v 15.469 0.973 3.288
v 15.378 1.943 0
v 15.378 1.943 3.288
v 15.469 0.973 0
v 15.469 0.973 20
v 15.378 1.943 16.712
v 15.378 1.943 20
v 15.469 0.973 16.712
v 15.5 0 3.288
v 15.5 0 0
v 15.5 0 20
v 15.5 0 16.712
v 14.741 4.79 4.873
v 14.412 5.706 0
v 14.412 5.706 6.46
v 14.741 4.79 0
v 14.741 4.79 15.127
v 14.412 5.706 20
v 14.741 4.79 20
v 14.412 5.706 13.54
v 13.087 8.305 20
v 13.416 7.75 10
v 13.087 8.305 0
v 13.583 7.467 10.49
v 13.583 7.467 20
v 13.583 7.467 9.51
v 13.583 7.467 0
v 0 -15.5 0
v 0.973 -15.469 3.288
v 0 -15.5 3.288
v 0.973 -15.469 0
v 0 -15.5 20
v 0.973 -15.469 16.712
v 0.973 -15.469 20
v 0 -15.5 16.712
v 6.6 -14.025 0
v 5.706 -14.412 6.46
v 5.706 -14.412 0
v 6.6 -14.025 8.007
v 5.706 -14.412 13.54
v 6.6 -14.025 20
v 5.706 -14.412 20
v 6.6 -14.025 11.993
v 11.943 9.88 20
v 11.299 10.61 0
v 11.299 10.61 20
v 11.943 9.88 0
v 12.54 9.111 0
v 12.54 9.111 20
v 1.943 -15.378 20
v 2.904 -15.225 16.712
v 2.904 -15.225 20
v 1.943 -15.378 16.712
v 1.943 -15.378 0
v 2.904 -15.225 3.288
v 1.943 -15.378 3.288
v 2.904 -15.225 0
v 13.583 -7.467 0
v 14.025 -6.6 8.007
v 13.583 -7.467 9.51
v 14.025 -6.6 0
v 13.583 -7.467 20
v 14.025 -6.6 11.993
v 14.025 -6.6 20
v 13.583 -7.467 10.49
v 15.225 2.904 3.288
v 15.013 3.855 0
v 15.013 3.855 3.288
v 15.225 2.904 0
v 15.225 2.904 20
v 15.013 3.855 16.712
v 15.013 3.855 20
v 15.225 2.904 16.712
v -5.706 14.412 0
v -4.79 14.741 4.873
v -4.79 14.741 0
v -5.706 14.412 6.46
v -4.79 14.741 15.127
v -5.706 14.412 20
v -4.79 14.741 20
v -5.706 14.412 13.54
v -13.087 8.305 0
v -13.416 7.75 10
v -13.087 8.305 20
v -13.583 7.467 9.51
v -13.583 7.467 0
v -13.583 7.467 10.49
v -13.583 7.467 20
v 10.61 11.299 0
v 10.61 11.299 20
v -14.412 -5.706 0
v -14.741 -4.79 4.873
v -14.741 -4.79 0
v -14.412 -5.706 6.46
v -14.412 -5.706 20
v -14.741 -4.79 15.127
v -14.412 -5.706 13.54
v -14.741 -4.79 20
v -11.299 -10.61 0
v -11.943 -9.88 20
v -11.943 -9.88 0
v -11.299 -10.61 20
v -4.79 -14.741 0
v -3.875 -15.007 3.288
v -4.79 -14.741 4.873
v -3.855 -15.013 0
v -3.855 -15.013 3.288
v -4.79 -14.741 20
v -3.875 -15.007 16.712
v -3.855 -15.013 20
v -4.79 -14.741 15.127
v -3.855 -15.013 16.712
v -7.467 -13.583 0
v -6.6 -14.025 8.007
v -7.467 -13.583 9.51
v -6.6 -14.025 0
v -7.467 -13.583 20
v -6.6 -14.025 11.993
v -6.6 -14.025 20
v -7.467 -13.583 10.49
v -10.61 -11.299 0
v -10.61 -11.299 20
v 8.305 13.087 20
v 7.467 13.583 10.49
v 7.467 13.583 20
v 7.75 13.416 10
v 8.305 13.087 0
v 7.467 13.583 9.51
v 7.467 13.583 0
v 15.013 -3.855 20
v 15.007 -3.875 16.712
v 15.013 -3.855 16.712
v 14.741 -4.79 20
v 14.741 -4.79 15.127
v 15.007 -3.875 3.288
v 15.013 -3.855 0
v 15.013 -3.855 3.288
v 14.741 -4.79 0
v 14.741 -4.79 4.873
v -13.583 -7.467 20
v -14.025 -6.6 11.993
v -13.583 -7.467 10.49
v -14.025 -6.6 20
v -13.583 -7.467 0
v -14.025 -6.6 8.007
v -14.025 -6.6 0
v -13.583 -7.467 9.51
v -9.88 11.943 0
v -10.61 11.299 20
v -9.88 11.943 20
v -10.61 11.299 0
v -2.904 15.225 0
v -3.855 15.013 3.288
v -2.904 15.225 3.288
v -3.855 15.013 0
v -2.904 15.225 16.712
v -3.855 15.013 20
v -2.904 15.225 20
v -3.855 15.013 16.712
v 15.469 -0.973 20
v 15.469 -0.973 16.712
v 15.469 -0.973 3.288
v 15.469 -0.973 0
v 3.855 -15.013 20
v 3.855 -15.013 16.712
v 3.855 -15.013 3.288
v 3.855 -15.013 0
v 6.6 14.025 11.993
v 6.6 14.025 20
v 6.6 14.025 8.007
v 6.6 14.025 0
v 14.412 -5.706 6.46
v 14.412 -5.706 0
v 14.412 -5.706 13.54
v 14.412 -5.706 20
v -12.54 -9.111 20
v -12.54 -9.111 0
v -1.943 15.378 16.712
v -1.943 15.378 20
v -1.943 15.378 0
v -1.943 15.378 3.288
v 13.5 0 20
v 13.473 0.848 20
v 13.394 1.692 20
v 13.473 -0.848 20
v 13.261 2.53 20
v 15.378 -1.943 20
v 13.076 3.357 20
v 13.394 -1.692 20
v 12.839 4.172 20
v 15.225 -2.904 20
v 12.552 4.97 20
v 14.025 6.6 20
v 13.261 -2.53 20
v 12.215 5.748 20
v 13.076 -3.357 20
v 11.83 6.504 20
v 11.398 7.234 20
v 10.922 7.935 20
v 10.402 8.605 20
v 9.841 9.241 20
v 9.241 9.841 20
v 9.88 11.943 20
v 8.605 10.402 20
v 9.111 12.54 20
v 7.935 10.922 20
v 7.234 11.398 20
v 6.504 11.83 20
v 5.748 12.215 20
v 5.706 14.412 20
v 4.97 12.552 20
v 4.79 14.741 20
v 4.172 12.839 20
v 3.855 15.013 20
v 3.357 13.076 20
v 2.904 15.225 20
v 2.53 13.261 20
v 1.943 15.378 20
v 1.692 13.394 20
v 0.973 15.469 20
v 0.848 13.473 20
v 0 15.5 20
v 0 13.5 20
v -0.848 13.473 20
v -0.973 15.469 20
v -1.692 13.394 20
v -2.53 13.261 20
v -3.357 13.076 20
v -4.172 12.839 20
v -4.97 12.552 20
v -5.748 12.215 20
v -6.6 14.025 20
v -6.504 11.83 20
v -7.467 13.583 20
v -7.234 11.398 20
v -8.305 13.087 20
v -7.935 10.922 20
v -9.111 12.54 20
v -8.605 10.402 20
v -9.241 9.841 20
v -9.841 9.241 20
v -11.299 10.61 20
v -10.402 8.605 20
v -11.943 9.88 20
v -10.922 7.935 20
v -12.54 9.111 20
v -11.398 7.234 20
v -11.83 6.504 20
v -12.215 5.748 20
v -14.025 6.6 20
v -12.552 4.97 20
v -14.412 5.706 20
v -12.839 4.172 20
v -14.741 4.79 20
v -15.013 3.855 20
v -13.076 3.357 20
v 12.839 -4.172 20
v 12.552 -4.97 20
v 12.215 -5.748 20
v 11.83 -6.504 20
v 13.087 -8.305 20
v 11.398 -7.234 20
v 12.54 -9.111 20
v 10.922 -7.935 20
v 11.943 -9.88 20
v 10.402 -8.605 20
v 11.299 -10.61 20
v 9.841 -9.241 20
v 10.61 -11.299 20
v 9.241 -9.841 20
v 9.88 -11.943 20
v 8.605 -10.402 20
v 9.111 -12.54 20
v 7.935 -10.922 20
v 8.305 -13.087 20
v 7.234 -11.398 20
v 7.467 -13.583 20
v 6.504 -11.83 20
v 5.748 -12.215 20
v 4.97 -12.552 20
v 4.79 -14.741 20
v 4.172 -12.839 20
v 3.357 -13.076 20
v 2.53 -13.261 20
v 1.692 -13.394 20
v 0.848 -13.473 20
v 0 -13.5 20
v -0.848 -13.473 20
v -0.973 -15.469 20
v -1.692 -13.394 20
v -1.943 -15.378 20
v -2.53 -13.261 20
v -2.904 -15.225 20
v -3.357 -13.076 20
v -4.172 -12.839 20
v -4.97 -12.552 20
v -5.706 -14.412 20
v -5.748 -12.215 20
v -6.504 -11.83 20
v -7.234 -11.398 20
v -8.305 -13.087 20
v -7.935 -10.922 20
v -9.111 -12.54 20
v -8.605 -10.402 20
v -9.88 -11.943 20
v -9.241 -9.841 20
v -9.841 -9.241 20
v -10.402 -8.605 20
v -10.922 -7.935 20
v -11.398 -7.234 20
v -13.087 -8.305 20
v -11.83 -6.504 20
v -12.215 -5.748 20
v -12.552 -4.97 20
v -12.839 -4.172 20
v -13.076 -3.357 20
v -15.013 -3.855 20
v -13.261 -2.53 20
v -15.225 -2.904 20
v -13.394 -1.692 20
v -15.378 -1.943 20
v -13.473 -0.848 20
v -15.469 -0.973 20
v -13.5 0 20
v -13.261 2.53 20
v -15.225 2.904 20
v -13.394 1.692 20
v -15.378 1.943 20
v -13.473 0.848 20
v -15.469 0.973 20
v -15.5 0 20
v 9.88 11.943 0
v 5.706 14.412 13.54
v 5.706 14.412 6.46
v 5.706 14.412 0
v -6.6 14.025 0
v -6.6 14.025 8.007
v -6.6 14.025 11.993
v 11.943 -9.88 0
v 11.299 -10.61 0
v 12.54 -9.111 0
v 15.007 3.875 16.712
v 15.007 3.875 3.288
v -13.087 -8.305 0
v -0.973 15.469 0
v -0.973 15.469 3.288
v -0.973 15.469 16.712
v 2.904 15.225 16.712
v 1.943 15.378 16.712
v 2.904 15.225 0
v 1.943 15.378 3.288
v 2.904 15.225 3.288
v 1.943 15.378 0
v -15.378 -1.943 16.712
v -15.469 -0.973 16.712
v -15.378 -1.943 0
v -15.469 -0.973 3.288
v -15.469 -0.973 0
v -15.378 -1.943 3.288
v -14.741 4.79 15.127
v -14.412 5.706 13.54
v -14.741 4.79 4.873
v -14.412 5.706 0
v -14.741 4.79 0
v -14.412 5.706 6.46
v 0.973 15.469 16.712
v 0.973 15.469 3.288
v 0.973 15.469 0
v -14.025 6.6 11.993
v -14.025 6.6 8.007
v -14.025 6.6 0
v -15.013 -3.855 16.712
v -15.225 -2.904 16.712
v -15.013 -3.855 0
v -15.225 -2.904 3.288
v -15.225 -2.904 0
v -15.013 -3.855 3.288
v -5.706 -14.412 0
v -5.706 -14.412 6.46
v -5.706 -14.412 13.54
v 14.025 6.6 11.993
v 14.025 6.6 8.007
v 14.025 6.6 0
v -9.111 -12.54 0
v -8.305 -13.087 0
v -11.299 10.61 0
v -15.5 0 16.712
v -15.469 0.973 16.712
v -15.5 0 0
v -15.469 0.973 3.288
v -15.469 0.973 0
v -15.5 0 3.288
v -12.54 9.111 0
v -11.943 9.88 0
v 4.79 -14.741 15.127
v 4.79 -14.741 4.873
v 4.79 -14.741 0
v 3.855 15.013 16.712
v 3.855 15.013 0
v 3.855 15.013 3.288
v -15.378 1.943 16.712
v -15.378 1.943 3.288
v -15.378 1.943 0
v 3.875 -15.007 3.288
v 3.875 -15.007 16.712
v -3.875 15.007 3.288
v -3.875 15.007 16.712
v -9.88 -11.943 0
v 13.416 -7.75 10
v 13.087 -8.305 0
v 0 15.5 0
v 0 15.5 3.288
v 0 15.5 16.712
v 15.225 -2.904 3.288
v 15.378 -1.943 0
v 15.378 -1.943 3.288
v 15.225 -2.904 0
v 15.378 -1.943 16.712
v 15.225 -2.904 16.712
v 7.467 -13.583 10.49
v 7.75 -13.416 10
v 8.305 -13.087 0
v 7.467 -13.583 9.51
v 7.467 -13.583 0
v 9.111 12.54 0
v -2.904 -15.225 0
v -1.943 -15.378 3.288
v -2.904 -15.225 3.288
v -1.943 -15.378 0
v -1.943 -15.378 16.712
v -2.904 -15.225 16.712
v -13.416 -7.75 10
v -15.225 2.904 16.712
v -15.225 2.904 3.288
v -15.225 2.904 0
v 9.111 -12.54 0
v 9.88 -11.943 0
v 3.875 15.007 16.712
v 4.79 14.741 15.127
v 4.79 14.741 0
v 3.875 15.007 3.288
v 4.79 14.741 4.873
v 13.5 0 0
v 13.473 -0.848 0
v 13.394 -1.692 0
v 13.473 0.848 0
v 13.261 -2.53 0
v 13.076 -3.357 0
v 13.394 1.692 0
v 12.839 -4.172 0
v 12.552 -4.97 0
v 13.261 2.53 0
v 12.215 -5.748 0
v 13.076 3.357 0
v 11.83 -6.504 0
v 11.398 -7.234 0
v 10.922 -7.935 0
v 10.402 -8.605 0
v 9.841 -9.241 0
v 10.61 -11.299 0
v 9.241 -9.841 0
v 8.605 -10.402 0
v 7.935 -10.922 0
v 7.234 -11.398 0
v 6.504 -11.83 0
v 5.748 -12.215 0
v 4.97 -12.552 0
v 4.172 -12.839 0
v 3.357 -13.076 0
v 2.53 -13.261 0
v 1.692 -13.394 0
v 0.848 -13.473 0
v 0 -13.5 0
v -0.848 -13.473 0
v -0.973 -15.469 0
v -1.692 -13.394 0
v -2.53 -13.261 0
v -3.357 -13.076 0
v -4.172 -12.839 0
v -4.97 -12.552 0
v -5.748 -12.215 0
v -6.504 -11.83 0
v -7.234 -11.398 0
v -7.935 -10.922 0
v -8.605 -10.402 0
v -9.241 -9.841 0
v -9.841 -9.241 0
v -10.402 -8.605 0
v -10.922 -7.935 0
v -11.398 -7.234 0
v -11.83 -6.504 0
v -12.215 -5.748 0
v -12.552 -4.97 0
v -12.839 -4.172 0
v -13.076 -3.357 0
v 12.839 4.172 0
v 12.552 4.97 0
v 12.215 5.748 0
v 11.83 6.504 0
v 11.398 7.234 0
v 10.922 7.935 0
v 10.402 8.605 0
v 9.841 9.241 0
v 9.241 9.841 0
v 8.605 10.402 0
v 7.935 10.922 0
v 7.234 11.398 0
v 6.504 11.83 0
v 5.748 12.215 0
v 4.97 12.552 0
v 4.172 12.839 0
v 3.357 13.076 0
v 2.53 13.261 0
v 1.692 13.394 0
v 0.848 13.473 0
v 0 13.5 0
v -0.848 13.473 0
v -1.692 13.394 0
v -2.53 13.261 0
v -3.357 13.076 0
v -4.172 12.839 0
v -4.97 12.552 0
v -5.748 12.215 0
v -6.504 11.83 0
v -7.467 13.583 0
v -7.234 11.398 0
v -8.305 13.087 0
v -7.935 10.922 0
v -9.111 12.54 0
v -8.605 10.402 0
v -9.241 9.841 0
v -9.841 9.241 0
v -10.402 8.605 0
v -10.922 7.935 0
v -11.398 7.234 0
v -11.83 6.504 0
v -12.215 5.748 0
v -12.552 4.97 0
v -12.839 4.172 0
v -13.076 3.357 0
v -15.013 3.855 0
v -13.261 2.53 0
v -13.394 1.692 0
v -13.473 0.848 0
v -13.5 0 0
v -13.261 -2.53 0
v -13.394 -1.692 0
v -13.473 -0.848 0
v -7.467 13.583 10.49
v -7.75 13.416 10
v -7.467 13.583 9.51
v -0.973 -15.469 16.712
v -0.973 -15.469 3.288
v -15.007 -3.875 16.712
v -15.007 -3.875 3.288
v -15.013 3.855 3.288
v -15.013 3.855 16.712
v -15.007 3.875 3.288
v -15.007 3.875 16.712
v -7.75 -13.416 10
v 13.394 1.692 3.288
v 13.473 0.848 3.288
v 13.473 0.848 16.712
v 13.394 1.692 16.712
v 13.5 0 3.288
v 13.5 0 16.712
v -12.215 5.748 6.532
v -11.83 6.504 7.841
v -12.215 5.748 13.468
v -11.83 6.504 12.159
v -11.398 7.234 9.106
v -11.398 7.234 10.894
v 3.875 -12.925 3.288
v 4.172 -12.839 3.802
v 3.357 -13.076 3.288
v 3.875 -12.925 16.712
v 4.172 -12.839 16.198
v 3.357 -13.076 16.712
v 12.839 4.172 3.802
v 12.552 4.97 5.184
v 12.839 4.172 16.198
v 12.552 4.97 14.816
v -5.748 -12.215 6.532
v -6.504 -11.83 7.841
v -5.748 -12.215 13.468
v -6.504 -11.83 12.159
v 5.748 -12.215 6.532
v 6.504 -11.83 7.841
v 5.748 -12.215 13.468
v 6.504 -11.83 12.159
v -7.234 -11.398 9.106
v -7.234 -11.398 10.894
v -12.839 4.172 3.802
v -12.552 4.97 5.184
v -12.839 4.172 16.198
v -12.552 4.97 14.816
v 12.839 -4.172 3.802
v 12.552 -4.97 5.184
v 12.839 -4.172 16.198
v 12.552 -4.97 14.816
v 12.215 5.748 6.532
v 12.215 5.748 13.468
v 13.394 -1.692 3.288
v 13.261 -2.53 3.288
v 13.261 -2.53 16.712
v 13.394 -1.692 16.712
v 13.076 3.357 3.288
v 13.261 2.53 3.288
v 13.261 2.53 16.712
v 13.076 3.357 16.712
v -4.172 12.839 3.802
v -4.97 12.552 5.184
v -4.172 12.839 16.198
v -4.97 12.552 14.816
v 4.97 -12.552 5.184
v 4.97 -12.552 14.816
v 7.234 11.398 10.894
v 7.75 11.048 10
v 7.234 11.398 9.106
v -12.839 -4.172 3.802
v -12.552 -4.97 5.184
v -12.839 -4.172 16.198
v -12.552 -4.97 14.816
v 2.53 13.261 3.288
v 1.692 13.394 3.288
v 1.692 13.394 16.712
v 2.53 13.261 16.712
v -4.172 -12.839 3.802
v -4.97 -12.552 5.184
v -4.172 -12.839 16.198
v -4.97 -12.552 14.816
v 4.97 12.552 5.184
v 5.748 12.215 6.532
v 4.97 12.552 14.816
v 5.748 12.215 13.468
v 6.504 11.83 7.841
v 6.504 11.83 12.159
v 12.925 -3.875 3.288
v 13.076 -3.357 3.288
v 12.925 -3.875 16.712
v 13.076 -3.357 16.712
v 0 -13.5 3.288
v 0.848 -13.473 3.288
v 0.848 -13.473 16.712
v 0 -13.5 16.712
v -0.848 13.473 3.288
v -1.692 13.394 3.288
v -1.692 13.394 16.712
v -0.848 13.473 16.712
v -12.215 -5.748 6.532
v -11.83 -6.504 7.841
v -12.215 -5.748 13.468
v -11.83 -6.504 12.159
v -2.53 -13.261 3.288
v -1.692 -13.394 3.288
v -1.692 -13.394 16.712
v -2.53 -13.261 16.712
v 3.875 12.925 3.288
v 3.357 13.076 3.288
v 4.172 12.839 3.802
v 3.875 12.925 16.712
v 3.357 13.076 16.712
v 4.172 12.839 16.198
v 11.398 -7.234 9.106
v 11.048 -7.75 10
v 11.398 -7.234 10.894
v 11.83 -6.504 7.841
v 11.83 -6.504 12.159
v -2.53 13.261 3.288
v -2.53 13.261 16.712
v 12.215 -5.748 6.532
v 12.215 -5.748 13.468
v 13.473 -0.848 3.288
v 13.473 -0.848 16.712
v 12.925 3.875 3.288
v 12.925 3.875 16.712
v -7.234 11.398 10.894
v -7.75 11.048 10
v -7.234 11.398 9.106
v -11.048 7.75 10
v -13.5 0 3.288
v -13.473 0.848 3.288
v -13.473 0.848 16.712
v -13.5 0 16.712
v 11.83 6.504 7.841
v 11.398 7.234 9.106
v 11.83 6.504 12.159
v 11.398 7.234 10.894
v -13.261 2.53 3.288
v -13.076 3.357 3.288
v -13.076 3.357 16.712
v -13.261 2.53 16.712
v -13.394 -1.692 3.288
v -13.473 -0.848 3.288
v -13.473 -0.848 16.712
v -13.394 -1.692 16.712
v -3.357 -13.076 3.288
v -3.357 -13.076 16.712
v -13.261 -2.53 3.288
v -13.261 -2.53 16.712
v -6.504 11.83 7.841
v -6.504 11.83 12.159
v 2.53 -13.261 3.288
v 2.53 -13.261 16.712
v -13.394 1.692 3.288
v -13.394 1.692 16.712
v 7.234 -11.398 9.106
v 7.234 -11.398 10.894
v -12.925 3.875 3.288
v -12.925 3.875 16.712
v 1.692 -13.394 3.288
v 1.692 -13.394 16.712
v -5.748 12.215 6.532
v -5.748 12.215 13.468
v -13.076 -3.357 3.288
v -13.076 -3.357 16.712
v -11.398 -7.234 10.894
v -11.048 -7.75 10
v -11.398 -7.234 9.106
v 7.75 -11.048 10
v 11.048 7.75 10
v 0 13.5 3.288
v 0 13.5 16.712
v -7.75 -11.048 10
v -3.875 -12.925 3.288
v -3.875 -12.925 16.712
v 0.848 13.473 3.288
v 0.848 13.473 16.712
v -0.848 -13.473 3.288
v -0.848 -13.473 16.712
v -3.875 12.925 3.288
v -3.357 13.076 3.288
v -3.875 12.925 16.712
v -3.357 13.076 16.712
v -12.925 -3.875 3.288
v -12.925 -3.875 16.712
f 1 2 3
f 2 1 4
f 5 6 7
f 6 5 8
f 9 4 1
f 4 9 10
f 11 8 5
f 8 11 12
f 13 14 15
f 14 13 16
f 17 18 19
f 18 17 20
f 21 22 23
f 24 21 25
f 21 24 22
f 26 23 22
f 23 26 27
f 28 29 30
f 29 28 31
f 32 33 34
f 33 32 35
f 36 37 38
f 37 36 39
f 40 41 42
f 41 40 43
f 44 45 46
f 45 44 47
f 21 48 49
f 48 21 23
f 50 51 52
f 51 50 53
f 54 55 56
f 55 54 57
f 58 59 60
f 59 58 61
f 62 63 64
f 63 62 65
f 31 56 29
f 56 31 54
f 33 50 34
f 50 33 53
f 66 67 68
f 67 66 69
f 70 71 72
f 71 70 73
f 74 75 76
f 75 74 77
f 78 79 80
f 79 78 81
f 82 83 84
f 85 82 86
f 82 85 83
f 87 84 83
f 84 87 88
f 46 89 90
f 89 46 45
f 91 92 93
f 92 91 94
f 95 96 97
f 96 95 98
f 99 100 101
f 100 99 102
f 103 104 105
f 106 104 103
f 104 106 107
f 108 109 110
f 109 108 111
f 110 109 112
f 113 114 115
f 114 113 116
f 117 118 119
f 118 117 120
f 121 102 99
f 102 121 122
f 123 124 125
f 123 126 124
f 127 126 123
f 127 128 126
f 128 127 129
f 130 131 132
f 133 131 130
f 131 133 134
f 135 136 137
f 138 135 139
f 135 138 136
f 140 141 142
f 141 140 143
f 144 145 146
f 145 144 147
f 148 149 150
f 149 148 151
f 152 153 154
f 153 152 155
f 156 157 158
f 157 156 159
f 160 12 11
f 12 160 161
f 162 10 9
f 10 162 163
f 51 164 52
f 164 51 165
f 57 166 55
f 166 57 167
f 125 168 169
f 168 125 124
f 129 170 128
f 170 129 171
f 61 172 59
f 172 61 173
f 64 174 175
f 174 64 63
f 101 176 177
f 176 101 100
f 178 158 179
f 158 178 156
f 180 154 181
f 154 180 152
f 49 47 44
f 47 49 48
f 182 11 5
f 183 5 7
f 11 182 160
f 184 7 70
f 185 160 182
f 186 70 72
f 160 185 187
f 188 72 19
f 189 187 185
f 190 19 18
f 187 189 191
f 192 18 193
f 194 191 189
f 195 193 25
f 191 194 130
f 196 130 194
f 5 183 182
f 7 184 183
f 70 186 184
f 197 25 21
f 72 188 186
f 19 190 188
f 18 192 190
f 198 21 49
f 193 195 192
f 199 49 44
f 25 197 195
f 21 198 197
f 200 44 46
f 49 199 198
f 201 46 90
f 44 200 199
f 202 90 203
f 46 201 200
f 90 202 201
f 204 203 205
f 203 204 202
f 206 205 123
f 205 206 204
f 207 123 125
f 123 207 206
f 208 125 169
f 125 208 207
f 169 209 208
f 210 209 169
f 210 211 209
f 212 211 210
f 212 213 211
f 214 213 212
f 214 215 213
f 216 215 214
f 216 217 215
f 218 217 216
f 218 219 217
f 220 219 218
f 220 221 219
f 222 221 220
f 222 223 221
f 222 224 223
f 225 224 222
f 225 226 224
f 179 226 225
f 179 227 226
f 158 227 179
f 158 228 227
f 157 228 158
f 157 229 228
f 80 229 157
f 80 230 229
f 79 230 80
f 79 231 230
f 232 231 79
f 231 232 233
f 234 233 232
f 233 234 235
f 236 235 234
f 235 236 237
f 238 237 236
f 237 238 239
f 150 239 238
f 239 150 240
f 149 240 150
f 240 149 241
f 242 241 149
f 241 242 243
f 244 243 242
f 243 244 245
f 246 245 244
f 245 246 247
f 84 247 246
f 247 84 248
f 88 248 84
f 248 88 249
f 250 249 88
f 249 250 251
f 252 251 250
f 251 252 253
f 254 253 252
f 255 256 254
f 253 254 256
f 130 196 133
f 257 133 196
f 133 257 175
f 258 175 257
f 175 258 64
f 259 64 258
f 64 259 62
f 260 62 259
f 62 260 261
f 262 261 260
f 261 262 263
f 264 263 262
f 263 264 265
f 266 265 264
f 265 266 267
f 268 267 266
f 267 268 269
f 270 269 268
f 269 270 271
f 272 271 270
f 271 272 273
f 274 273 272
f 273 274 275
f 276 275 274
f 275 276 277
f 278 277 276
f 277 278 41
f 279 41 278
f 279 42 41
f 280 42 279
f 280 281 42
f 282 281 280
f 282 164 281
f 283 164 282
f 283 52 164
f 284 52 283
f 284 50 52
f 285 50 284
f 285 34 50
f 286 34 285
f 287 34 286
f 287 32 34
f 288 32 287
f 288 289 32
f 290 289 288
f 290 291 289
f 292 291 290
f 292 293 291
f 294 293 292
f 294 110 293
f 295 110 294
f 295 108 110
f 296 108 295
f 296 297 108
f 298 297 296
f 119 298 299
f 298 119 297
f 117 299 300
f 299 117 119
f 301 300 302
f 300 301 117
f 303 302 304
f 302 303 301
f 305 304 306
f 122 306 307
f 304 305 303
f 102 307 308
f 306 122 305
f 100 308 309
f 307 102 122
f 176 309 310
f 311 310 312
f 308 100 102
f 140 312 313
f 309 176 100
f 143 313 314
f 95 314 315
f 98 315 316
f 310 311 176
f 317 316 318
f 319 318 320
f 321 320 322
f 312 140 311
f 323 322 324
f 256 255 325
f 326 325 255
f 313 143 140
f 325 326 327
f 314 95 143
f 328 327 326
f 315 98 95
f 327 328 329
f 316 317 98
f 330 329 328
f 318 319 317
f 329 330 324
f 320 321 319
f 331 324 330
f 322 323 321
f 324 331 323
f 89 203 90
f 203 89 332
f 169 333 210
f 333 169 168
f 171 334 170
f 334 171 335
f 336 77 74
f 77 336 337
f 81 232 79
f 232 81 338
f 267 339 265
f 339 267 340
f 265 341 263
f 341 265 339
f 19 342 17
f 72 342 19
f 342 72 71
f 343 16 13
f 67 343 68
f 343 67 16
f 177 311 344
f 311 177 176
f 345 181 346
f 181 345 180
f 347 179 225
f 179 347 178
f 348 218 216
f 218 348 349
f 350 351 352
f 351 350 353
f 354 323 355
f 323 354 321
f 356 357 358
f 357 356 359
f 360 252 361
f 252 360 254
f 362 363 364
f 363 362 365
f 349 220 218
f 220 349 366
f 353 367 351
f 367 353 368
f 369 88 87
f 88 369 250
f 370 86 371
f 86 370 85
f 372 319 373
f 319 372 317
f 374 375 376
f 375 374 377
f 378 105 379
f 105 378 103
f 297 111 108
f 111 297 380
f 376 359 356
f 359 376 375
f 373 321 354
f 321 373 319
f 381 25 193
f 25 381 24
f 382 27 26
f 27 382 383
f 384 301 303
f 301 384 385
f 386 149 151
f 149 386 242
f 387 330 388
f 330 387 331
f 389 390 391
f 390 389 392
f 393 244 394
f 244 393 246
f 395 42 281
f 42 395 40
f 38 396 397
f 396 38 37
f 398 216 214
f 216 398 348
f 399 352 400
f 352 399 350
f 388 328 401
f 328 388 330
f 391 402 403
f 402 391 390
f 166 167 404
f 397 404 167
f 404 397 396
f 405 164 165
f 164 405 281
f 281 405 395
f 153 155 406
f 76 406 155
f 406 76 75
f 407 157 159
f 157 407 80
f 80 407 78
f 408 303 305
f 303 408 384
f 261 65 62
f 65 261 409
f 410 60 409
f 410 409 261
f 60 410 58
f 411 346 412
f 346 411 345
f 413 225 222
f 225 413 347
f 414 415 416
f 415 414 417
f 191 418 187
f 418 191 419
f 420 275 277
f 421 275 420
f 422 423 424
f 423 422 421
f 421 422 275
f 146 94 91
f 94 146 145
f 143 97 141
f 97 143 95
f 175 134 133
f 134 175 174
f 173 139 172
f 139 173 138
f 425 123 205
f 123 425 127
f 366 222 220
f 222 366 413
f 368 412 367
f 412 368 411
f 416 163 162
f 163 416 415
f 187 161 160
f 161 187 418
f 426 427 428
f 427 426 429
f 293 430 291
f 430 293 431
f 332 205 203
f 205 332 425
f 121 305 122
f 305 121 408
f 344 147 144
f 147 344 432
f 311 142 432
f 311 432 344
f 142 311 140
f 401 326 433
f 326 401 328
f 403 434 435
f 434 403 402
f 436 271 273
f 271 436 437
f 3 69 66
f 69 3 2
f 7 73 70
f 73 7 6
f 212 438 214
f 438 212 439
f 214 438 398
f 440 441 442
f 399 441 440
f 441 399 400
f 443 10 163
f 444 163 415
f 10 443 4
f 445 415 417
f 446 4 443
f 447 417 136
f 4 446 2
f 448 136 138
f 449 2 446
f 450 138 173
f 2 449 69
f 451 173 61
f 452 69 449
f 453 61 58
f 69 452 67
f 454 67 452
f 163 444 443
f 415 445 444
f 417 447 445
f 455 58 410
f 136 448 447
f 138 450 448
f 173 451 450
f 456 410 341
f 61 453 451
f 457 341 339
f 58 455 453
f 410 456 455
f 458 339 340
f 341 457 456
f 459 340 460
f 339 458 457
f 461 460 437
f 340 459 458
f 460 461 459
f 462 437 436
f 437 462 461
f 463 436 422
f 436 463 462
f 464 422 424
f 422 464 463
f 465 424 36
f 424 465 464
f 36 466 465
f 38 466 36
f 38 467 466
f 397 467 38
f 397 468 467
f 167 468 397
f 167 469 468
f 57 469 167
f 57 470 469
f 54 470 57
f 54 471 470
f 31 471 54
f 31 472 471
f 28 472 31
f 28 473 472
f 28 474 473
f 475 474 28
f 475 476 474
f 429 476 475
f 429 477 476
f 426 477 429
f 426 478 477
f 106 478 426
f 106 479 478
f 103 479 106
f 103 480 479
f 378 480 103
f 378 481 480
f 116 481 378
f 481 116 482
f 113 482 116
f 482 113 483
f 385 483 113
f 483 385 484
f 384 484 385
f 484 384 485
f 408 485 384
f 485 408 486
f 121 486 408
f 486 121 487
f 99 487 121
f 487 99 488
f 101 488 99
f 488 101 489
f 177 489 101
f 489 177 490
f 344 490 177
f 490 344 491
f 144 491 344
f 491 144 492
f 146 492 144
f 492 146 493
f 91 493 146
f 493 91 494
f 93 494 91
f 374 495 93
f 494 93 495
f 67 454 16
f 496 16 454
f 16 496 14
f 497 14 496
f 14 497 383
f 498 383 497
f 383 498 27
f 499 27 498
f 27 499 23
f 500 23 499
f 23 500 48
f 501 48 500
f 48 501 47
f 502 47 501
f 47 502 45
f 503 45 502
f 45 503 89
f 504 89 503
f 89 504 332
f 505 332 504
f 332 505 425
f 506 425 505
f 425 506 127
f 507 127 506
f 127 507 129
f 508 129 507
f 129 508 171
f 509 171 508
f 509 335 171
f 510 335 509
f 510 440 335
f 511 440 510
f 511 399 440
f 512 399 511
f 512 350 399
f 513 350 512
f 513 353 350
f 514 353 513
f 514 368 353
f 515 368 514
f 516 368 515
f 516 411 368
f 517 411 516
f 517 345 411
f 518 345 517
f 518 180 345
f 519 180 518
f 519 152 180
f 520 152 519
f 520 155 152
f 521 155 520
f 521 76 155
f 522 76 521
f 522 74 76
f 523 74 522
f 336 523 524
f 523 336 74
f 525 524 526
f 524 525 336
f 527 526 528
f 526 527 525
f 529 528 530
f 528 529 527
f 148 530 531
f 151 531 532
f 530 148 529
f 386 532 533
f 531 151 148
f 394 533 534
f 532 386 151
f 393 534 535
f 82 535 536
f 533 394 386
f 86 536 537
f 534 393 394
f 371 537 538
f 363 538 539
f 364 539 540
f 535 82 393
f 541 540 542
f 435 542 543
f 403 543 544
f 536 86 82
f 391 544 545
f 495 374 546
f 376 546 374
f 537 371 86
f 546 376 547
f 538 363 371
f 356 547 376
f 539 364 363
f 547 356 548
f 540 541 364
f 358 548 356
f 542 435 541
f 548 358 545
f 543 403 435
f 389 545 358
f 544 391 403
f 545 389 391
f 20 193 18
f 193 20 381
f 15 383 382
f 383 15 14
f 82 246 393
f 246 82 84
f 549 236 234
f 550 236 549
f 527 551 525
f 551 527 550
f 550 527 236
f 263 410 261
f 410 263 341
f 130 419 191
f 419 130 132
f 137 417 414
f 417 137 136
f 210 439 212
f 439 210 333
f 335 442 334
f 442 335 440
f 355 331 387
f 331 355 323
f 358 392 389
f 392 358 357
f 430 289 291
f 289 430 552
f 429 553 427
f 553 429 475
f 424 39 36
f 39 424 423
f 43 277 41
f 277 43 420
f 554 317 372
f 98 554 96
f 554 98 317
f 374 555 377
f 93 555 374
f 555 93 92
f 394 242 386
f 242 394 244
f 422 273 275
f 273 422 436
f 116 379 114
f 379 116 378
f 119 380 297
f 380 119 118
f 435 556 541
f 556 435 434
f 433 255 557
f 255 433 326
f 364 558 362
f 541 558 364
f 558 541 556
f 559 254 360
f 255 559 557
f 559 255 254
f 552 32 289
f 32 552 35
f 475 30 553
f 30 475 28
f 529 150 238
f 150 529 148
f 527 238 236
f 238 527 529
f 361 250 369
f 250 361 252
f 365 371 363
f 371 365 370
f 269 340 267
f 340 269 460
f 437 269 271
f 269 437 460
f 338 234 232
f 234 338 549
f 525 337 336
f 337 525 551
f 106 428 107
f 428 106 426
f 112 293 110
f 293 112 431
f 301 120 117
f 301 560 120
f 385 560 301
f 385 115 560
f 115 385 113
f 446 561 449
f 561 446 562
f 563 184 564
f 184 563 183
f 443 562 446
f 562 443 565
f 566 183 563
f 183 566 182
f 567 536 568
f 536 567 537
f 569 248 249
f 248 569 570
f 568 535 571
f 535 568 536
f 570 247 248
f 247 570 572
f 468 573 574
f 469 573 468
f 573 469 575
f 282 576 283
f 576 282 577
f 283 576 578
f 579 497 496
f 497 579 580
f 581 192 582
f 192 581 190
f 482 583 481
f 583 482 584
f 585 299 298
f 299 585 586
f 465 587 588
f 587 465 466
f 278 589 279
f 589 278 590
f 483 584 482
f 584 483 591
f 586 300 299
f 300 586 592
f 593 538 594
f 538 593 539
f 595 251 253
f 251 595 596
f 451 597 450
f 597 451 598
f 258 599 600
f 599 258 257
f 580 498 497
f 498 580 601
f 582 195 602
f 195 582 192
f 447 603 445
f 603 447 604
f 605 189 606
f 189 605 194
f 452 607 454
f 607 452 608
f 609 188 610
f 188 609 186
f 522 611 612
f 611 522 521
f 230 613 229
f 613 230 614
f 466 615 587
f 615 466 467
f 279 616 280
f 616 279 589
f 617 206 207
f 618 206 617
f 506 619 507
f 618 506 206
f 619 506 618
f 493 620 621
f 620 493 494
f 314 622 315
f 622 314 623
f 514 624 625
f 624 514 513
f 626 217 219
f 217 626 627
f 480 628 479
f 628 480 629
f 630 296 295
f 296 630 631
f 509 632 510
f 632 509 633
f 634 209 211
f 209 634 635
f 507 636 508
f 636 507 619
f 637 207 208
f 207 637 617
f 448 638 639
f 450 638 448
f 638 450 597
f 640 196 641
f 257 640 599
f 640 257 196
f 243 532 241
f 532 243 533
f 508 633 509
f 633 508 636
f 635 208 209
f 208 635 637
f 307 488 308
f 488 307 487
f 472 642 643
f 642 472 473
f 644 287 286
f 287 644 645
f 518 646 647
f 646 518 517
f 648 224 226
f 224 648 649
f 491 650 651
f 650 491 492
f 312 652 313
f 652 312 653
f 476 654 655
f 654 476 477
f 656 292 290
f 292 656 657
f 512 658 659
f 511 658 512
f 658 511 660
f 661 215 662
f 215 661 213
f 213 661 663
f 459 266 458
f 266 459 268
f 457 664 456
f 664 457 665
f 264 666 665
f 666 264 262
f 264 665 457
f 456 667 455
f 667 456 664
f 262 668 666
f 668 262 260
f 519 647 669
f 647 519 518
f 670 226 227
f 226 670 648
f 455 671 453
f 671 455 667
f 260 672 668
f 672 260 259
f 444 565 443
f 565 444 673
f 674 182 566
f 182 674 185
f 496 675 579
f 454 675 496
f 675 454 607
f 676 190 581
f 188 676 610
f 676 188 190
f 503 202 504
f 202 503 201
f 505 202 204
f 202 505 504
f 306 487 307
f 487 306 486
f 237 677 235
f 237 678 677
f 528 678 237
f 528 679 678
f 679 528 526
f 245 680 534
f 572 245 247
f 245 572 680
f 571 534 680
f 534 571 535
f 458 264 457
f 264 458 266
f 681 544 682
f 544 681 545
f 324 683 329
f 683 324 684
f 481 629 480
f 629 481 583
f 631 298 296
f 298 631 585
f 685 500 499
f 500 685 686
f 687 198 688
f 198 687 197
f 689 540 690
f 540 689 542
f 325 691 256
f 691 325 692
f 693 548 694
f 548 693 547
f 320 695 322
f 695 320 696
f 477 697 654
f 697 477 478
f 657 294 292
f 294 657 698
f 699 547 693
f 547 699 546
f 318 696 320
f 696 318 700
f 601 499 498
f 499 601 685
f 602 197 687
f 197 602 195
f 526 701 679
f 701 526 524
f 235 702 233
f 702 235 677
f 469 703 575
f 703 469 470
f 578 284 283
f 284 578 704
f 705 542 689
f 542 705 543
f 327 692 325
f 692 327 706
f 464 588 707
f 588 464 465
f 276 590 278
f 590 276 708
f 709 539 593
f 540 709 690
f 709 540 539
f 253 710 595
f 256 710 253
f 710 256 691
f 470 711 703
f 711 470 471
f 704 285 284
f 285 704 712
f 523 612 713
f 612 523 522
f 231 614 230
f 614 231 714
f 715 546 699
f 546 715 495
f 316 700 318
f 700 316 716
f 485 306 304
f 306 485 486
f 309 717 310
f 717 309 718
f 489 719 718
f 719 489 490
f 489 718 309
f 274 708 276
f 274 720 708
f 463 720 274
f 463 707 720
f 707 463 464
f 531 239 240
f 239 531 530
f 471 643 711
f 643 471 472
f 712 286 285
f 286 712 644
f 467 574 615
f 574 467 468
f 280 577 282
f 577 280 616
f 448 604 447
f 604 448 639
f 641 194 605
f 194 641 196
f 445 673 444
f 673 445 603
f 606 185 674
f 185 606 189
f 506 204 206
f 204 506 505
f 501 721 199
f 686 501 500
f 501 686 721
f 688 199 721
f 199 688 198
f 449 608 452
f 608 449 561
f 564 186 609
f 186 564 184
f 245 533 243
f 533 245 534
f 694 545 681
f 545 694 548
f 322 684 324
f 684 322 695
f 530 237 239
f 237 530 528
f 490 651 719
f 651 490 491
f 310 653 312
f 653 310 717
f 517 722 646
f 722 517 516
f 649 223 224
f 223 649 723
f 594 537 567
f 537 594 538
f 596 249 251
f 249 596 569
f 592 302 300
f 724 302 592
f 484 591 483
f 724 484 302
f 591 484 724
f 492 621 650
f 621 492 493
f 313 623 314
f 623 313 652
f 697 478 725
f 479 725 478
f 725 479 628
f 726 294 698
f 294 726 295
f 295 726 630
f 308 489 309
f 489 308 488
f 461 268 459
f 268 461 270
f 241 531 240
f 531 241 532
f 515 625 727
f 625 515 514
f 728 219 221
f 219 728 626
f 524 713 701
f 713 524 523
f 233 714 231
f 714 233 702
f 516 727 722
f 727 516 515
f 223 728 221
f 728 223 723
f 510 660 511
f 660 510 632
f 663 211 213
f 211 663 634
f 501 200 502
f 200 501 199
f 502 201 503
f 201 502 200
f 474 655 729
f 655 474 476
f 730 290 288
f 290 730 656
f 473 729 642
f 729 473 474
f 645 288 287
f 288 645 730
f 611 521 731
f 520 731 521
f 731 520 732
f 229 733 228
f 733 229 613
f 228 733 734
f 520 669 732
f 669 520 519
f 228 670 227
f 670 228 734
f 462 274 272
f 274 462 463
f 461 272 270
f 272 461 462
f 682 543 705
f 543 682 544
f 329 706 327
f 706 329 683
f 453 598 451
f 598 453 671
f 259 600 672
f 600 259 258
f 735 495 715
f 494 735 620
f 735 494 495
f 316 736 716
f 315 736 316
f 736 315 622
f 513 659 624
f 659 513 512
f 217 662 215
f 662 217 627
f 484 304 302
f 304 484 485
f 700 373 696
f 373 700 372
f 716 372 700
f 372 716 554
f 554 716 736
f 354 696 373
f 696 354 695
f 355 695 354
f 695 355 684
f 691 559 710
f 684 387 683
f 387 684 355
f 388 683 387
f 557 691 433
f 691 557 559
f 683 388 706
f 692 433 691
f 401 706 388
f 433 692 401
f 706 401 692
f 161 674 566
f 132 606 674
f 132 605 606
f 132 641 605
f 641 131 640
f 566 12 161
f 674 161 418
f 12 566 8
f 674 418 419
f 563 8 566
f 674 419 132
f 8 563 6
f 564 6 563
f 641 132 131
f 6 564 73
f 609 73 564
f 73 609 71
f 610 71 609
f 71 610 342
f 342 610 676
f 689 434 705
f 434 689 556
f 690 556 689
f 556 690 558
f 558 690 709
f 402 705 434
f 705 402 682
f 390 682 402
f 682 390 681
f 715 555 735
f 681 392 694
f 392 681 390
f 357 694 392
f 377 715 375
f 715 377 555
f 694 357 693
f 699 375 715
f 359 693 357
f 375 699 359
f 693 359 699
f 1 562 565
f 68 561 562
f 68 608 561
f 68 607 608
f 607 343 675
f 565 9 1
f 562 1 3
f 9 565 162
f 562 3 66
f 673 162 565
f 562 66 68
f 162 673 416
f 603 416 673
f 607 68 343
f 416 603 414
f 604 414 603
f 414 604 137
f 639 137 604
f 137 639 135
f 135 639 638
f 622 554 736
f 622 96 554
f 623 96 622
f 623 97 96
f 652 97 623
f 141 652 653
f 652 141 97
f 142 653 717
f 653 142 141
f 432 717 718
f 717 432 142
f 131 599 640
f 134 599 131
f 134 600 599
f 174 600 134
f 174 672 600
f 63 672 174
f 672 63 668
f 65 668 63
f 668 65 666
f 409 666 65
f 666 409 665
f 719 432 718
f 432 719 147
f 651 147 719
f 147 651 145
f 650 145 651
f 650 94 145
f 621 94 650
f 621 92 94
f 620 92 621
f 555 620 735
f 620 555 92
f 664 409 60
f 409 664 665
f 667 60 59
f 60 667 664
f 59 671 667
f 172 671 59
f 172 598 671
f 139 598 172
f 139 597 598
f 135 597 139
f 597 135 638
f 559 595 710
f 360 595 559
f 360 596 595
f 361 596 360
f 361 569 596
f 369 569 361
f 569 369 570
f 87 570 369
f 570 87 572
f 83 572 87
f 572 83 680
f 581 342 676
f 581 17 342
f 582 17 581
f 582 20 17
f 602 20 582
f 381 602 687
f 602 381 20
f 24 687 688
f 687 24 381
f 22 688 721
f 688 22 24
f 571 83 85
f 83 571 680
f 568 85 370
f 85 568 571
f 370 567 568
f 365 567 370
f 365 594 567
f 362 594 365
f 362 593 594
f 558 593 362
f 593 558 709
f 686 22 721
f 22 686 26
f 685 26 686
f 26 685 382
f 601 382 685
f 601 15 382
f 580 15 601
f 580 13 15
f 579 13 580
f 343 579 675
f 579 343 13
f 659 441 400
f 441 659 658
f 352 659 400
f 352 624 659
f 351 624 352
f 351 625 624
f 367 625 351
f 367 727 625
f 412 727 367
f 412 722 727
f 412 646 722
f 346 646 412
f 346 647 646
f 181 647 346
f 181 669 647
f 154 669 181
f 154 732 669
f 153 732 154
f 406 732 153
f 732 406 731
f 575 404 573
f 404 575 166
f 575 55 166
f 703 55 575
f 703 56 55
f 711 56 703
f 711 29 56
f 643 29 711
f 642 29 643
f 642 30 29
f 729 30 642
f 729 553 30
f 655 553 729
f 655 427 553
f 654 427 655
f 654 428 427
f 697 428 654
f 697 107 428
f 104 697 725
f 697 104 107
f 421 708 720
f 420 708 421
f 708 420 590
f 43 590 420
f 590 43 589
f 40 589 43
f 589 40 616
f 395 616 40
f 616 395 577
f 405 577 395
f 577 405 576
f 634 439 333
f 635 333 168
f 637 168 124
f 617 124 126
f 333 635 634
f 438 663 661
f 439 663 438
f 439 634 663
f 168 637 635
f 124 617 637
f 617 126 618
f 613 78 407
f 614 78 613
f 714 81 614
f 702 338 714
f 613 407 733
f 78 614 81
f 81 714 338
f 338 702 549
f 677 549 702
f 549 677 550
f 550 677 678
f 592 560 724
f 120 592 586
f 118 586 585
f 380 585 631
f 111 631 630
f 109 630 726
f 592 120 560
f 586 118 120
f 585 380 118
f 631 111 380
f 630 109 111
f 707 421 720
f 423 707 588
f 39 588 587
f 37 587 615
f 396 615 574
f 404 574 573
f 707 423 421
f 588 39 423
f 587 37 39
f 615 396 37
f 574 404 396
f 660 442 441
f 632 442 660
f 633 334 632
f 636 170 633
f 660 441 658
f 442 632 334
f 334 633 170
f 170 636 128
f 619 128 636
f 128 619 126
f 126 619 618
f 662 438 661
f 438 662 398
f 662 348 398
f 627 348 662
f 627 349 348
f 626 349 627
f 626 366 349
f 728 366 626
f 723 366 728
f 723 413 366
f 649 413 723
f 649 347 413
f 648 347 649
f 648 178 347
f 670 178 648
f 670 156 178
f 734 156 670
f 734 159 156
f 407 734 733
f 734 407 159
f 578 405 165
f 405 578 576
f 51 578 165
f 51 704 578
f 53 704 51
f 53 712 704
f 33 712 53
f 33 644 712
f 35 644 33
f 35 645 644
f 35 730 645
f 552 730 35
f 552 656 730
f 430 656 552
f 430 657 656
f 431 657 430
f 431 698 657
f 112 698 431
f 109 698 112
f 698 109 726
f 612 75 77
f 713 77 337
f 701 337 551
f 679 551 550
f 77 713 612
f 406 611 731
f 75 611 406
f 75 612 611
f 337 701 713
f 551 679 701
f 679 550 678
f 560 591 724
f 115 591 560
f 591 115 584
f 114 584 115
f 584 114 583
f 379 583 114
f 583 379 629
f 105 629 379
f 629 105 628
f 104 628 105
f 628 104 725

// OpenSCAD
$fn = 100;

sides = 6;
shell = 2;
innerRadius = 27/2;
outerRadius = innerRadius + shell;
height = 20;
throughRadius = outerRadius / 2;
throughLength = outerRadius * 2.25;

 difference() {
     cylinder(height, r=outerRadius);
    cylinder(height + 4, r=innerRadius);
     
    translate([throughLength / -2,0,height/2]) {
        rotate([0,90,0]) {
            throughPolygon();
        }
    }
    
    translate([0,throughLength / -2,height/2]) {
        rotate([0,90,90]) {
            throughPolygon();
        }
    }
    
 

 }

 module regular_polygon(order = 4, r=1){
     angles=[ for (i = [0:order-1]) i*(360/order) ];
     coords=[ for (th=angles) [r*cos(th), r*sin(th)] ];
     polygon(coords);
 }
 
 

 
 module throughPolygon() {
         
     linear_extrude (throughLength) {
     rotate([0, 0,180/sides]) {         
        regular_polygon(sides,throughRadius);
              }
     }
 }
